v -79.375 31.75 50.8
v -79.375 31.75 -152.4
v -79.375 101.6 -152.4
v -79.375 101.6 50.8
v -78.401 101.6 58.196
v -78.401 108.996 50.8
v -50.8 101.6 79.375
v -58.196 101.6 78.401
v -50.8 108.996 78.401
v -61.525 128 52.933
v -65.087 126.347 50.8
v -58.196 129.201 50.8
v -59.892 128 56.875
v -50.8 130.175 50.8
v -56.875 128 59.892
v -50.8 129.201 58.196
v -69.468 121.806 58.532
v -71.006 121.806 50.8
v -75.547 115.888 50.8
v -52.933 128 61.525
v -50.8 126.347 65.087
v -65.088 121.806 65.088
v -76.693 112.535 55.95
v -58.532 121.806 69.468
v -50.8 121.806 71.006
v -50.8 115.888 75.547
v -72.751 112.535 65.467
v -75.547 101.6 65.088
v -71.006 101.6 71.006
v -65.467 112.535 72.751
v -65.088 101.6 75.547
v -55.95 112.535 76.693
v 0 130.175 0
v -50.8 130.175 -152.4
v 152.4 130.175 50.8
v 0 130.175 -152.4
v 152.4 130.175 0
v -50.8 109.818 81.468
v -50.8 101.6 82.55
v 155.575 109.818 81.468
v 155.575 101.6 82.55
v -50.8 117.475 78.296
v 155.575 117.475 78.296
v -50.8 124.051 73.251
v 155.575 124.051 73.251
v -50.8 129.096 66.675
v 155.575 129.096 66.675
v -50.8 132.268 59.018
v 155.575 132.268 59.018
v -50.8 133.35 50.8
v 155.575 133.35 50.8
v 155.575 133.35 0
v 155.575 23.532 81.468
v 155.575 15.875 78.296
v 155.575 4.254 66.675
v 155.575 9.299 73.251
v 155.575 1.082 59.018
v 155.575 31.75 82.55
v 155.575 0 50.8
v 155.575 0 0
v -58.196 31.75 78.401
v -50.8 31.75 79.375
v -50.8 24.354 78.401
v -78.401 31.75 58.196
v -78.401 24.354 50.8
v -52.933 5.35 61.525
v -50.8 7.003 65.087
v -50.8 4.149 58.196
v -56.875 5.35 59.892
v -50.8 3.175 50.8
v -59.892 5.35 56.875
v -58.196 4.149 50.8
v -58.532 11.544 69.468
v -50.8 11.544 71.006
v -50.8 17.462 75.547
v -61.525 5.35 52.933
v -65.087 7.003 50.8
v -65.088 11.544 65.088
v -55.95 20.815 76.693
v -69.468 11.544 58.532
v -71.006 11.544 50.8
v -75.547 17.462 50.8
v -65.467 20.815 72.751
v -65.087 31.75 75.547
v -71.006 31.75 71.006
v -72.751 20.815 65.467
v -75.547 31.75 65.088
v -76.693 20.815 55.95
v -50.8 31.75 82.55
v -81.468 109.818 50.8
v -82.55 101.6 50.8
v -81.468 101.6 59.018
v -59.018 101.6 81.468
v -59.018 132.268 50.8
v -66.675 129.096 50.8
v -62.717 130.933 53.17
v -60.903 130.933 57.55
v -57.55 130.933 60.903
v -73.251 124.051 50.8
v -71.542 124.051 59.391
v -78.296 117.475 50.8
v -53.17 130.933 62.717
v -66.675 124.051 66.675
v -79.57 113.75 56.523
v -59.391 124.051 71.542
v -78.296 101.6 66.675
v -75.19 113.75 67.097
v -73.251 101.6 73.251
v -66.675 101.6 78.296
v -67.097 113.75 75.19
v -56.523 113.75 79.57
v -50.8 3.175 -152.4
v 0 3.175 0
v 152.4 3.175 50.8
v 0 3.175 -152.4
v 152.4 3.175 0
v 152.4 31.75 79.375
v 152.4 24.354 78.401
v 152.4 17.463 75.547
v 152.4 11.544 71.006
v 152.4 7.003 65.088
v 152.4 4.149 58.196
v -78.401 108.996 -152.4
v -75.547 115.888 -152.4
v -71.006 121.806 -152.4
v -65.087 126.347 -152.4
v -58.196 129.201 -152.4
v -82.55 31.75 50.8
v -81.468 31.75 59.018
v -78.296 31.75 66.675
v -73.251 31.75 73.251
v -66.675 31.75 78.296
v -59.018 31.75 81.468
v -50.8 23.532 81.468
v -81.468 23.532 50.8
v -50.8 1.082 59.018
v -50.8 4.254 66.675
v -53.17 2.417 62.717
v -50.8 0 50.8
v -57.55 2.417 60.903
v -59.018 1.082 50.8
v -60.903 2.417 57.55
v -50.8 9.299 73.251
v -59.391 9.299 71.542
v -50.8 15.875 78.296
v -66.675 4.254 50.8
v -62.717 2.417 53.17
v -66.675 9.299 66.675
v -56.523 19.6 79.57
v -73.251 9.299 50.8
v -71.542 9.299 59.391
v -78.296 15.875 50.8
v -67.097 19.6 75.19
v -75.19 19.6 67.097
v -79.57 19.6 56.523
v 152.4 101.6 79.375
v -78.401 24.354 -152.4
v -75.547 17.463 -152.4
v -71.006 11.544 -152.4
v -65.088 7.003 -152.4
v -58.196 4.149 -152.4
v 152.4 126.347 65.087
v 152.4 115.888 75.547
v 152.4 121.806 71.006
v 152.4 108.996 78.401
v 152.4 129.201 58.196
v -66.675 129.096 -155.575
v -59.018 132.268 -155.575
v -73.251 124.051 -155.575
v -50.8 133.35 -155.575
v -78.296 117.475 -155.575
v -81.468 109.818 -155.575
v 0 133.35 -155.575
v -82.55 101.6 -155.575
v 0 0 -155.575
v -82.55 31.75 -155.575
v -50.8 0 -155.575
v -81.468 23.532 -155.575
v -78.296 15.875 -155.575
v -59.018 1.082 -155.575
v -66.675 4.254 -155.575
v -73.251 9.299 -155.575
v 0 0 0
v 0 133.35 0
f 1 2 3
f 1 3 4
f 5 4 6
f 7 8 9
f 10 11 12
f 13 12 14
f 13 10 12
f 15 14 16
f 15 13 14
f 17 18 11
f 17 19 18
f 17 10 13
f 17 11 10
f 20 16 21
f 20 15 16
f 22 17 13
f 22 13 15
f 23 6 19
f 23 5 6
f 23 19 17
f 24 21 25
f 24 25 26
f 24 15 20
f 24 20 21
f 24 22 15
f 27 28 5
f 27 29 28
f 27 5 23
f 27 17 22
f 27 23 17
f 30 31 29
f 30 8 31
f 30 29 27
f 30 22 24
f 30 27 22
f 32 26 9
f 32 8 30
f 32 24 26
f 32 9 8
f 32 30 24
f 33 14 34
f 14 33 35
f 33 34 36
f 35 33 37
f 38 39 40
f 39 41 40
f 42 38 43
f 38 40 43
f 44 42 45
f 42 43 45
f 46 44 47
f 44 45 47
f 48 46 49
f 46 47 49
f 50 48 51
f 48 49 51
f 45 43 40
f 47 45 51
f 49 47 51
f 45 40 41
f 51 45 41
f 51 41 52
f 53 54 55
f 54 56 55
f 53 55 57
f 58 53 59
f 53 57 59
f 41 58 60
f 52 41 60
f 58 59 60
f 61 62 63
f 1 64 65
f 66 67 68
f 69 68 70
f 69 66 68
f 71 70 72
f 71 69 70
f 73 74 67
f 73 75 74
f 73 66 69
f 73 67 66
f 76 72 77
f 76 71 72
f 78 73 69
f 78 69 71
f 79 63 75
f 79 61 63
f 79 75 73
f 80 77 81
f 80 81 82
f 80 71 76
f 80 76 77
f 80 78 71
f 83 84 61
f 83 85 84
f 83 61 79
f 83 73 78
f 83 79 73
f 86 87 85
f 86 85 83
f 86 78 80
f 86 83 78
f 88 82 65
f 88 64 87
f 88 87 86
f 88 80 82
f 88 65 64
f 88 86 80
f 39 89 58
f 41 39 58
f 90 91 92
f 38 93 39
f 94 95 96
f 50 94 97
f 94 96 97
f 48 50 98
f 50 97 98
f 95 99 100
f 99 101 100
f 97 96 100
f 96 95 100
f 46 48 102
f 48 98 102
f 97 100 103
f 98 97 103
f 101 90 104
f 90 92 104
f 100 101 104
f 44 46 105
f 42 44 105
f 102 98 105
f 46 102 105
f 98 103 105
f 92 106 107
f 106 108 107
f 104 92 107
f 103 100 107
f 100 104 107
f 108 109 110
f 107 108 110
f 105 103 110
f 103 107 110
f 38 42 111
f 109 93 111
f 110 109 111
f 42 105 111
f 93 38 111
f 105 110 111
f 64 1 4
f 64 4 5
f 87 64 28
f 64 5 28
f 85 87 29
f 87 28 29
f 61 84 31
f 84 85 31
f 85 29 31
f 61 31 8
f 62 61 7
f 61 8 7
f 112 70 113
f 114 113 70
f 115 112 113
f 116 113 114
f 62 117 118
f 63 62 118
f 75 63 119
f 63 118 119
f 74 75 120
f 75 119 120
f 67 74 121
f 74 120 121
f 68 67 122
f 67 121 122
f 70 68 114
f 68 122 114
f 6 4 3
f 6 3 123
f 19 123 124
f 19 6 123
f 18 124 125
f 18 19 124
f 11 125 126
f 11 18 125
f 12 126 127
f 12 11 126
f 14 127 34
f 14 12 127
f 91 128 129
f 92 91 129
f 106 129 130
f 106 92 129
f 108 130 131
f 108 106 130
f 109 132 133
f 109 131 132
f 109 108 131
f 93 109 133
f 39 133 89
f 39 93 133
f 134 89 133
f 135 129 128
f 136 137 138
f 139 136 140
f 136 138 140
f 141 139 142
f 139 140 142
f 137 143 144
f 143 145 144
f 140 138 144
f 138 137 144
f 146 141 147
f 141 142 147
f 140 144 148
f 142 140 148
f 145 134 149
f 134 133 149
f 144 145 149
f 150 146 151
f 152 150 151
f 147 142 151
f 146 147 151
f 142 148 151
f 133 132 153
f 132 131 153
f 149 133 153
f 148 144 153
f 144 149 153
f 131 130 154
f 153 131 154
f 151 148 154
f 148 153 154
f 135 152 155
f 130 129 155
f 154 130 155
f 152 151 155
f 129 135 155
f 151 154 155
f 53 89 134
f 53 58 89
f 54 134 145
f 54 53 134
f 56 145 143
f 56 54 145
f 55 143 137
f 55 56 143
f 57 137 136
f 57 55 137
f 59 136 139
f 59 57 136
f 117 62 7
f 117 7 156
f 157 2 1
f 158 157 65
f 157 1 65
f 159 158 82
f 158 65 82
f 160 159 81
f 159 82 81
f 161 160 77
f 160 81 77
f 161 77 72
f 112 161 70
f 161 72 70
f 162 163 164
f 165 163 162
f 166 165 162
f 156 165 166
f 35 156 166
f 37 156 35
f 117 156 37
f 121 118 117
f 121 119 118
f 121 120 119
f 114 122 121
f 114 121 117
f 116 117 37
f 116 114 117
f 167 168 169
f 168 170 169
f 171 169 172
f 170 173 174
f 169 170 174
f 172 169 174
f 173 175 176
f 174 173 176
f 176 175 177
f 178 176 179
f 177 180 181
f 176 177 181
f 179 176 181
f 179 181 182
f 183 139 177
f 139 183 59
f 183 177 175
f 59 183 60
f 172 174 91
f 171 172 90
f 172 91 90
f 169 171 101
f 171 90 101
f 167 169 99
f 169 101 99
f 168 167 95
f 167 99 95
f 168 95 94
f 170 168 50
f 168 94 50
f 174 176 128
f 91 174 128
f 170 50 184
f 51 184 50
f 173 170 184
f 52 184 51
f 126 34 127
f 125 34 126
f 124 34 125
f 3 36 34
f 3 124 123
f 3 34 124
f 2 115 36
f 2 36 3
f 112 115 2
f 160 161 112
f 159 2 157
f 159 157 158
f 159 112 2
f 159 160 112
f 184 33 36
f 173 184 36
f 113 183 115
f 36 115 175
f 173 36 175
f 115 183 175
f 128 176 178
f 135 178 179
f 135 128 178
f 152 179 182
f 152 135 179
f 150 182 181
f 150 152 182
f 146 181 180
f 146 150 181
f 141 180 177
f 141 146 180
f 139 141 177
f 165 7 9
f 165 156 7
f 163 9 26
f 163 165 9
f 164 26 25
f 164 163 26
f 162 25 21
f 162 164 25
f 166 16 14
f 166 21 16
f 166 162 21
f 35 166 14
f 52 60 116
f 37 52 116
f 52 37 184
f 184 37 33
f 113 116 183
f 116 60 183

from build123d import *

# Parameters (mm, degrees)
BOSS_EXTRUDE1_DEPTH = 133.35
FILLET1_R           = 31.75
SHELL1_T            = -3.175


with BuildPart() as part:
    # Sketch1 → Boss-Extrude1 (new body)
    with BuildSketch(Plane(origin=(0, 0, 0), x_dir=(1, 0, 0), z_dir=(0, 1, 0))):
        Polygon((0, 0), (0, 155.575), (-82.55, 155.575), (-82.55, -82.55), (155.575, -82.55), (155.575, 0), align=None)
    extrude(amount=BOSS_EXTRUDE1_DEPTH)

    # Fillet1
    fillet1_edges = [part.edges().sort_by_distance(p)[0] for p in [
        (-82.55, 66.675, 82.55),
        (-82.55, 133.35, -36.5125),
        (36.5125, 133.35, 82.55),
        (36.5125, 0, 82.55),
        (-82.55, 0, -36.5125),
    ]]
    fillet(fillet1_edges, radius=FILLET1_R)

    # Shell1
    shell1_openings = [part.faces().sort_by_distance(p)[0] for p in [
        (0, 66.675, -77.7875),
        (77.7875, 66.675, 0),
    ]]
    offset(amount=SHELL1_T, openings=shell1_openings, kind=Kind.INTERSECTION)


solid = part.part
